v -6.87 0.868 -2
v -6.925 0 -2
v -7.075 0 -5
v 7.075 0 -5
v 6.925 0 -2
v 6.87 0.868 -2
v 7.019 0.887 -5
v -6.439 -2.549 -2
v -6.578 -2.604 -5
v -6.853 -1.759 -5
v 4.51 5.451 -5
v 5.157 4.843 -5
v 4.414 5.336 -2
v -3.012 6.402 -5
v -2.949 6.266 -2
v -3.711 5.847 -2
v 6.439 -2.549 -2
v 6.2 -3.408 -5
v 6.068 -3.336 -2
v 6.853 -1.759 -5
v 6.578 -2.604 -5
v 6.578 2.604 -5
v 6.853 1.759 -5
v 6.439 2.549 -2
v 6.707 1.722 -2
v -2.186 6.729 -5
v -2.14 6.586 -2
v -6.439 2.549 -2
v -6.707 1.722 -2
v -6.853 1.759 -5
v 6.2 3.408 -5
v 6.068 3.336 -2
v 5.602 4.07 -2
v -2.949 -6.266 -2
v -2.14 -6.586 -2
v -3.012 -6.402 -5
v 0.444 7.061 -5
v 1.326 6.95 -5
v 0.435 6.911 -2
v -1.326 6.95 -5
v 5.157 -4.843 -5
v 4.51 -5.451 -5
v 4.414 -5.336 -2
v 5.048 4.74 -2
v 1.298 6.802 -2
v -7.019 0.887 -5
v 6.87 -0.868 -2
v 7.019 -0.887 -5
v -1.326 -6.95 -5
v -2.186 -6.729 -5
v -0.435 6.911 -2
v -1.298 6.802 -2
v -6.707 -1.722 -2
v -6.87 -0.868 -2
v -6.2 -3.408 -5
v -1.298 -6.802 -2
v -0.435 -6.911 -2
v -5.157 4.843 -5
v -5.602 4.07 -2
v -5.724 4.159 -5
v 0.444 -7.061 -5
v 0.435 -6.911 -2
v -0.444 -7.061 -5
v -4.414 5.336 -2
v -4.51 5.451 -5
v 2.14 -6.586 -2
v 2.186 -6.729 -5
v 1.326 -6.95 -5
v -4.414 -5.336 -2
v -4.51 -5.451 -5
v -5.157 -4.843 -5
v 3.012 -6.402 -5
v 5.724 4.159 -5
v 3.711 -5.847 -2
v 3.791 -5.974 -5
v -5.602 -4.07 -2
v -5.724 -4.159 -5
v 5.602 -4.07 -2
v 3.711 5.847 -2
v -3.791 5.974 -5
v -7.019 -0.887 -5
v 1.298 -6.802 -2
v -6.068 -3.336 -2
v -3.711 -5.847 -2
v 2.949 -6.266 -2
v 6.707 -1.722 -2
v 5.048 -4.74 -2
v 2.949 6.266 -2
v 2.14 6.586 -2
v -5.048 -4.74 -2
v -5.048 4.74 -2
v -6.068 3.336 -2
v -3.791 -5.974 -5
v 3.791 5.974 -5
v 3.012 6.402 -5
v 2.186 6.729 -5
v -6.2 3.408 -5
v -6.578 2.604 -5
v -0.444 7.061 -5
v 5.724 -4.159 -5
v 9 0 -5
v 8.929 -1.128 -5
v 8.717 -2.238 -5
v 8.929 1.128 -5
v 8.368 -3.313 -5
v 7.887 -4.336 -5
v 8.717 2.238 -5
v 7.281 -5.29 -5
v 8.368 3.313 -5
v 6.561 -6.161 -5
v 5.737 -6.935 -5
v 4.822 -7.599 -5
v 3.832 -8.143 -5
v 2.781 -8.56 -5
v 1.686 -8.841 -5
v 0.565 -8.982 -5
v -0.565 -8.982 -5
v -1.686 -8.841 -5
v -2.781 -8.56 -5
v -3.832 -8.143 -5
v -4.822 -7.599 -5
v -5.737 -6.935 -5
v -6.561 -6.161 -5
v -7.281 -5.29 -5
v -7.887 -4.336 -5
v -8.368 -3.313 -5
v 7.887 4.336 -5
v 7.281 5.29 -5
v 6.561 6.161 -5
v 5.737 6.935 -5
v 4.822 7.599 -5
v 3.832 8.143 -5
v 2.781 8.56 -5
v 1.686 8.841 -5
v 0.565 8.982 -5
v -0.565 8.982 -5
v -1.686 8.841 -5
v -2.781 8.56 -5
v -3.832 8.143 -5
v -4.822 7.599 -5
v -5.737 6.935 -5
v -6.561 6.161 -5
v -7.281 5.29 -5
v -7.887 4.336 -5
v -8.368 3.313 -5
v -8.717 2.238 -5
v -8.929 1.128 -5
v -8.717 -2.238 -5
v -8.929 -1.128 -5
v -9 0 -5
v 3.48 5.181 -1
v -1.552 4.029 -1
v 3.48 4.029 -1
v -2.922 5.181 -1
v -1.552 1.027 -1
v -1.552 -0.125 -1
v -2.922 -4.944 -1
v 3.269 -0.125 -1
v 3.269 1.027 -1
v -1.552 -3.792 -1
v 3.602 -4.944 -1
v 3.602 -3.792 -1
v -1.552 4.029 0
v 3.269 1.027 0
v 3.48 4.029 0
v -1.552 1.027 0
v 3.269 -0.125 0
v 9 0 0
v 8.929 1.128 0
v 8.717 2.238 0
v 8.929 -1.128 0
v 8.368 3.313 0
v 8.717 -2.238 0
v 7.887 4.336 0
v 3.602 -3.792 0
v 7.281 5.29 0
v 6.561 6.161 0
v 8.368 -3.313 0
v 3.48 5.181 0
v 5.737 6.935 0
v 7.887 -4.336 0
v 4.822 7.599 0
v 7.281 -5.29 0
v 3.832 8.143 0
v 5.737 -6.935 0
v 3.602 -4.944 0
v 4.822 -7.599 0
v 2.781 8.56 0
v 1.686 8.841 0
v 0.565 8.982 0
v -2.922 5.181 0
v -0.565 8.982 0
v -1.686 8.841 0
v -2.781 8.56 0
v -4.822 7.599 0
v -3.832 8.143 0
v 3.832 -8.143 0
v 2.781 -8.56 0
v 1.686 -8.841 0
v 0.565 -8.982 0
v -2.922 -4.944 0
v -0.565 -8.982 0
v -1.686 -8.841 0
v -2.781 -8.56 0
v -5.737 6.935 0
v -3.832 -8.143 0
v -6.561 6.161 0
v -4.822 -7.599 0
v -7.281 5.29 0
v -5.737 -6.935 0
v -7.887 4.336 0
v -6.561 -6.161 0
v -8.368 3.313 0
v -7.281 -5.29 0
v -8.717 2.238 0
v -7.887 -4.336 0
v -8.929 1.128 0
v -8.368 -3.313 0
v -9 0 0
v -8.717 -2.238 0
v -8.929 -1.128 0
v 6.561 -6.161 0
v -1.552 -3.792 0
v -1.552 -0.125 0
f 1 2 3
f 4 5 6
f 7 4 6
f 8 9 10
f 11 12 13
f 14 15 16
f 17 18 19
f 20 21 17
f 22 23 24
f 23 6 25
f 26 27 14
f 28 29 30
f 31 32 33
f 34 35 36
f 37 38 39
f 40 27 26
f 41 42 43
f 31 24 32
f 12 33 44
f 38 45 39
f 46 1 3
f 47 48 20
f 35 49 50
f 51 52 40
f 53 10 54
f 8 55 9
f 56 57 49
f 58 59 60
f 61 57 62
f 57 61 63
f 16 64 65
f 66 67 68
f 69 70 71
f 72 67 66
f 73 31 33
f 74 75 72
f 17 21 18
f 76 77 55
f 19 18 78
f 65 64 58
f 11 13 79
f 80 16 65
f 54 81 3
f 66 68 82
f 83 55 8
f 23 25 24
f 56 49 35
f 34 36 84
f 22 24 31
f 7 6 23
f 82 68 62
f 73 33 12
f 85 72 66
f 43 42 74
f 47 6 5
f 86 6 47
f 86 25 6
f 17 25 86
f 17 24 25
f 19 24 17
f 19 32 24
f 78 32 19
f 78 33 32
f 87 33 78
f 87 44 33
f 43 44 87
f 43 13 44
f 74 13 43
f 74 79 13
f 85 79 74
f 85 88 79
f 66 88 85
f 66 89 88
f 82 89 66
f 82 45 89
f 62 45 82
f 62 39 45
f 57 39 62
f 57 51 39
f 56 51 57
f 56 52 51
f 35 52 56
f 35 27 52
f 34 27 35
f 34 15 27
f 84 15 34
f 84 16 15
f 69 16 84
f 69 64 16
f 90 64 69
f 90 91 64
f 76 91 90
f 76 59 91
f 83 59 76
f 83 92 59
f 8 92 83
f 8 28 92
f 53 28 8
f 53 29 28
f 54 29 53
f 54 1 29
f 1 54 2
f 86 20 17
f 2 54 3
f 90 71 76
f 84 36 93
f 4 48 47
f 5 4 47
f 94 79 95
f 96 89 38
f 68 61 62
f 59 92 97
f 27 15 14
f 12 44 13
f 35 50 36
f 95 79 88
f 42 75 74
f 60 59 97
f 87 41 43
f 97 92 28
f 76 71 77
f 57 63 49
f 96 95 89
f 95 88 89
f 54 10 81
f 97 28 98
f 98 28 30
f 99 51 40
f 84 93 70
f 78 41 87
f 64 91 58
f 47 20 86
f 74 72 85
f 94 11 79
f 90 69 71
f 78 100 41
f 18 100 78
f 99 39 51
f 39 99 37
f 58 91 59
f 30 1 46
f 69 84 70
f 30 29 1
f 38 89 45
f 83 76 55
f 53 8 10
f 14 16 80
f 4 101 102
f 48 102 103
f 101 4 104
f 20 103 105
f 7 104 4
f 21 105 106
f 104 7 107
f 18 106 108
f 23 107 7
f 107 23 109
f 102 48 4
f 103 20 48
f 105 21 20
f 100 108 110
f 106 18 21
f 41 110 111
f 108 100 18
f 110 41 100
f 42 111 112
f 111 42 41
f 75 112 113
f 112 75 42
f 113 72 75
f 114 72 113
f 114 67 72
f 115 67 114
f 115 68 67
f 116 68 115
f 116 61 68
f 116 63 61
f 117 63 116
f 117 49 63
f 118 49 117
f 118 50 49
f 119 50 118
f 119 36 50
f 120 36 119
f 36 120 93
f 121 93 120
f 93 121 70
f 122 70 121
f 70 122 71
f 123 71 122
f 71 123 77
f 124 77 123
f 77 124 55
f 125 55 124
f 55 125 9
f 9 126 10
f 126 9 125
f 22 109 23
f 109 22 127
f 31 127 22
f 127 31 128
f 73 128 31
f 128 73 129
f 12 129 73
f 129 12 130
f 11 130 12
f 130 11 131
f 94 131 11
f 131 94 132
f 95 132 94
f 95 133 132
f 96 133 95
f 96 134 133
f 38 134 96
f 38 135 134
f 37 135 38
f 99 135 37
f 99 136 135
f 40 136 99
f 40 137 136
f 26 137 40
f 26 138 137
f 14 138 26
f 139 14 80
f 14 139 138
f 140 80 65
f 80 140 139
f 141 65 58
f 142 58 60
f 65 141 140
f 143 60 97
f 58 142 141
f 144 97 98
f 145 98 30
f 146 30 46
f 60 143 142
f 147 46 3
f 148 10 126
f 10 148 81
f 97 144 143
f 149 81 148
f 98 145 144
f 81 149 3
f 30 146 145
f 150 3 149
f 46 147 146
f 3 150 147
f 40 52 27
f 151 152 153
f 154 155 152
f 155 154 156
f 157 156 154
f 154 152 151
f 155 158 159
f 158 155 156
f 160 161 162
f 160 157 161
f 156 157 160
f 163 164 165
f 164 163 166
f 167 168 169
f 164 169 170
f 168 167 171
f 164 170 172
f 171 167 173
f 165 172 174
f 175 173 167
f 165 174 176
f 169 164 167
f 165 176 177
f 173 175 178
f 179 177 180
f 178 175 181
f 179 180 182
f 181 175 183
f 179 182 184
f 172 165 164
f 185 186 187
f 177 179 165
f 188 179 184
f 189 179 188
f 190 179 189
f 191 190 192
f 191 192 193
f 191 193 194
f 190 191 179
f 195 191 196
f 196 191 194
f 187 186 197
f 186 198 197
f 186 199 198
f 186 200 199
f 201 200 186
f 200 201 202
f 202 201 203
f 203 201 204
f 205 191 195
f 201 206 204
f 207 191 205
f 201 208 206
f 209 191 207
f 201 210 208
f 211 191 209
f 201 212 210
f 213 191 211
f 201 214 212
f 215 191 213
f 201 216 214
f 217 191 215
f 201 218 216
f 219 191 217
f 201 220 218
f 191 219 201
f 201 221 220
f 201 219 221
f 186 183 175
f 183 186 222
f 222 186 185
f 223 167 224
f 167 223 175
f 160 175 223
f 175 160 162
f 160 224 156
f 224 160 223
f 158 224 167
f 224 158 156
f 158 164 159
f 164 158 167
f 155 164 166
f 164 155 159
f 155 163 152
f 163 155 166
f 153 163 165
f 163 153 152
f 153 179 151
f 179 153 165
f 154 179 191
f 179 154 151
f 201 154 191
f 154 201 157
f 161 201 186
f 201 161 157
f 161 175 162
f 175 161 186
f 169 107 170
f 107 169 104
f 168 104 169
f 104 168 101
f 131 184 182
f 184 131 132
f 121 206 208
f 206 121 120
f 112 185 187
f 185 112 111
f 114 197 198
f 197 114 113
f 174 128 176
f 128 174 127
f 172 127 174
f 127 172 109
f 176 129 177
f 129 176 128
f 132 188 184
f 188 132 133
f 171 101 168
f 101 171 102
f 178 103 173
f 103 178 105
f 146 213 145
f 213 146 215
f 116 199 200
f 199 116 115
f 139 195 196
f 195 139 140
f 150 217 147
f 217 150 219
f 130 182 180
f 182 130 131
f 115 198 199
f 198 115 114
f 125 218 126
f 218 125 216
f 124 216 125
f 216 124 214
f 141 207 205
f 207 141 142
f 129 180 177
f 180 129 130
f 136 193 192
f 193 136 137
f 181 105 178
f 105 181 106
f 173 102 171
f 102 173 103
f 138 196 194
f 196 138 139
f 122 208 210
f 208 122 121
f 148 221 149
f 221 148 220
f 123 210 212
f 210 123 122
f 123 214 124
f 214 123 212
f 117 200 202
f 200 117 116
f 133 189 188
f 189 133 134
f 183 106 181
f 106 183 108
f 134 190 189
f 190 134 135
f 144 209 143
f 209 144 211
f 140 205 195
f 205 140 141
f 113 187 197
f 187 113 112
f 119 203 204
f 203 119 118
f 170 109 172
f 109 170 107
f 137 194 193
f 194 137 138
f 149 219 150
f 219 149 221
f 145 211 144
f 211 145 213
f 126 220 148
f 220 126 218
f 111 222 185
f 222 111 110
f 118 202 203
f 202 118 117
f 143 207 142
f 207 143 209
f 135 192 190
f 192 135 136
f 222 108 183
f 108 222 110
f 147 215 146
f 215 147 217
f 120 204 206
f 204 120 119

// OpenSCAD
$fn = 50;

difference() {
	union() {
		translate(v = [0, 0, -5.0]) {
			cylinder(h = 5, r = 9.0);
		}
	}
	union() {
		#translate(v = [0, 0, -5.0]) {
			cylinder(h = 3, r1 = 7.075, r2 = 6.925);
		}
		translate(v = [0, 0, -1]) {
			linear_extrude(height = 1) {
				text(font = "Impact", halign = "center", size = 10, text = "E", valign = "center");
			}
		}
	}
}
